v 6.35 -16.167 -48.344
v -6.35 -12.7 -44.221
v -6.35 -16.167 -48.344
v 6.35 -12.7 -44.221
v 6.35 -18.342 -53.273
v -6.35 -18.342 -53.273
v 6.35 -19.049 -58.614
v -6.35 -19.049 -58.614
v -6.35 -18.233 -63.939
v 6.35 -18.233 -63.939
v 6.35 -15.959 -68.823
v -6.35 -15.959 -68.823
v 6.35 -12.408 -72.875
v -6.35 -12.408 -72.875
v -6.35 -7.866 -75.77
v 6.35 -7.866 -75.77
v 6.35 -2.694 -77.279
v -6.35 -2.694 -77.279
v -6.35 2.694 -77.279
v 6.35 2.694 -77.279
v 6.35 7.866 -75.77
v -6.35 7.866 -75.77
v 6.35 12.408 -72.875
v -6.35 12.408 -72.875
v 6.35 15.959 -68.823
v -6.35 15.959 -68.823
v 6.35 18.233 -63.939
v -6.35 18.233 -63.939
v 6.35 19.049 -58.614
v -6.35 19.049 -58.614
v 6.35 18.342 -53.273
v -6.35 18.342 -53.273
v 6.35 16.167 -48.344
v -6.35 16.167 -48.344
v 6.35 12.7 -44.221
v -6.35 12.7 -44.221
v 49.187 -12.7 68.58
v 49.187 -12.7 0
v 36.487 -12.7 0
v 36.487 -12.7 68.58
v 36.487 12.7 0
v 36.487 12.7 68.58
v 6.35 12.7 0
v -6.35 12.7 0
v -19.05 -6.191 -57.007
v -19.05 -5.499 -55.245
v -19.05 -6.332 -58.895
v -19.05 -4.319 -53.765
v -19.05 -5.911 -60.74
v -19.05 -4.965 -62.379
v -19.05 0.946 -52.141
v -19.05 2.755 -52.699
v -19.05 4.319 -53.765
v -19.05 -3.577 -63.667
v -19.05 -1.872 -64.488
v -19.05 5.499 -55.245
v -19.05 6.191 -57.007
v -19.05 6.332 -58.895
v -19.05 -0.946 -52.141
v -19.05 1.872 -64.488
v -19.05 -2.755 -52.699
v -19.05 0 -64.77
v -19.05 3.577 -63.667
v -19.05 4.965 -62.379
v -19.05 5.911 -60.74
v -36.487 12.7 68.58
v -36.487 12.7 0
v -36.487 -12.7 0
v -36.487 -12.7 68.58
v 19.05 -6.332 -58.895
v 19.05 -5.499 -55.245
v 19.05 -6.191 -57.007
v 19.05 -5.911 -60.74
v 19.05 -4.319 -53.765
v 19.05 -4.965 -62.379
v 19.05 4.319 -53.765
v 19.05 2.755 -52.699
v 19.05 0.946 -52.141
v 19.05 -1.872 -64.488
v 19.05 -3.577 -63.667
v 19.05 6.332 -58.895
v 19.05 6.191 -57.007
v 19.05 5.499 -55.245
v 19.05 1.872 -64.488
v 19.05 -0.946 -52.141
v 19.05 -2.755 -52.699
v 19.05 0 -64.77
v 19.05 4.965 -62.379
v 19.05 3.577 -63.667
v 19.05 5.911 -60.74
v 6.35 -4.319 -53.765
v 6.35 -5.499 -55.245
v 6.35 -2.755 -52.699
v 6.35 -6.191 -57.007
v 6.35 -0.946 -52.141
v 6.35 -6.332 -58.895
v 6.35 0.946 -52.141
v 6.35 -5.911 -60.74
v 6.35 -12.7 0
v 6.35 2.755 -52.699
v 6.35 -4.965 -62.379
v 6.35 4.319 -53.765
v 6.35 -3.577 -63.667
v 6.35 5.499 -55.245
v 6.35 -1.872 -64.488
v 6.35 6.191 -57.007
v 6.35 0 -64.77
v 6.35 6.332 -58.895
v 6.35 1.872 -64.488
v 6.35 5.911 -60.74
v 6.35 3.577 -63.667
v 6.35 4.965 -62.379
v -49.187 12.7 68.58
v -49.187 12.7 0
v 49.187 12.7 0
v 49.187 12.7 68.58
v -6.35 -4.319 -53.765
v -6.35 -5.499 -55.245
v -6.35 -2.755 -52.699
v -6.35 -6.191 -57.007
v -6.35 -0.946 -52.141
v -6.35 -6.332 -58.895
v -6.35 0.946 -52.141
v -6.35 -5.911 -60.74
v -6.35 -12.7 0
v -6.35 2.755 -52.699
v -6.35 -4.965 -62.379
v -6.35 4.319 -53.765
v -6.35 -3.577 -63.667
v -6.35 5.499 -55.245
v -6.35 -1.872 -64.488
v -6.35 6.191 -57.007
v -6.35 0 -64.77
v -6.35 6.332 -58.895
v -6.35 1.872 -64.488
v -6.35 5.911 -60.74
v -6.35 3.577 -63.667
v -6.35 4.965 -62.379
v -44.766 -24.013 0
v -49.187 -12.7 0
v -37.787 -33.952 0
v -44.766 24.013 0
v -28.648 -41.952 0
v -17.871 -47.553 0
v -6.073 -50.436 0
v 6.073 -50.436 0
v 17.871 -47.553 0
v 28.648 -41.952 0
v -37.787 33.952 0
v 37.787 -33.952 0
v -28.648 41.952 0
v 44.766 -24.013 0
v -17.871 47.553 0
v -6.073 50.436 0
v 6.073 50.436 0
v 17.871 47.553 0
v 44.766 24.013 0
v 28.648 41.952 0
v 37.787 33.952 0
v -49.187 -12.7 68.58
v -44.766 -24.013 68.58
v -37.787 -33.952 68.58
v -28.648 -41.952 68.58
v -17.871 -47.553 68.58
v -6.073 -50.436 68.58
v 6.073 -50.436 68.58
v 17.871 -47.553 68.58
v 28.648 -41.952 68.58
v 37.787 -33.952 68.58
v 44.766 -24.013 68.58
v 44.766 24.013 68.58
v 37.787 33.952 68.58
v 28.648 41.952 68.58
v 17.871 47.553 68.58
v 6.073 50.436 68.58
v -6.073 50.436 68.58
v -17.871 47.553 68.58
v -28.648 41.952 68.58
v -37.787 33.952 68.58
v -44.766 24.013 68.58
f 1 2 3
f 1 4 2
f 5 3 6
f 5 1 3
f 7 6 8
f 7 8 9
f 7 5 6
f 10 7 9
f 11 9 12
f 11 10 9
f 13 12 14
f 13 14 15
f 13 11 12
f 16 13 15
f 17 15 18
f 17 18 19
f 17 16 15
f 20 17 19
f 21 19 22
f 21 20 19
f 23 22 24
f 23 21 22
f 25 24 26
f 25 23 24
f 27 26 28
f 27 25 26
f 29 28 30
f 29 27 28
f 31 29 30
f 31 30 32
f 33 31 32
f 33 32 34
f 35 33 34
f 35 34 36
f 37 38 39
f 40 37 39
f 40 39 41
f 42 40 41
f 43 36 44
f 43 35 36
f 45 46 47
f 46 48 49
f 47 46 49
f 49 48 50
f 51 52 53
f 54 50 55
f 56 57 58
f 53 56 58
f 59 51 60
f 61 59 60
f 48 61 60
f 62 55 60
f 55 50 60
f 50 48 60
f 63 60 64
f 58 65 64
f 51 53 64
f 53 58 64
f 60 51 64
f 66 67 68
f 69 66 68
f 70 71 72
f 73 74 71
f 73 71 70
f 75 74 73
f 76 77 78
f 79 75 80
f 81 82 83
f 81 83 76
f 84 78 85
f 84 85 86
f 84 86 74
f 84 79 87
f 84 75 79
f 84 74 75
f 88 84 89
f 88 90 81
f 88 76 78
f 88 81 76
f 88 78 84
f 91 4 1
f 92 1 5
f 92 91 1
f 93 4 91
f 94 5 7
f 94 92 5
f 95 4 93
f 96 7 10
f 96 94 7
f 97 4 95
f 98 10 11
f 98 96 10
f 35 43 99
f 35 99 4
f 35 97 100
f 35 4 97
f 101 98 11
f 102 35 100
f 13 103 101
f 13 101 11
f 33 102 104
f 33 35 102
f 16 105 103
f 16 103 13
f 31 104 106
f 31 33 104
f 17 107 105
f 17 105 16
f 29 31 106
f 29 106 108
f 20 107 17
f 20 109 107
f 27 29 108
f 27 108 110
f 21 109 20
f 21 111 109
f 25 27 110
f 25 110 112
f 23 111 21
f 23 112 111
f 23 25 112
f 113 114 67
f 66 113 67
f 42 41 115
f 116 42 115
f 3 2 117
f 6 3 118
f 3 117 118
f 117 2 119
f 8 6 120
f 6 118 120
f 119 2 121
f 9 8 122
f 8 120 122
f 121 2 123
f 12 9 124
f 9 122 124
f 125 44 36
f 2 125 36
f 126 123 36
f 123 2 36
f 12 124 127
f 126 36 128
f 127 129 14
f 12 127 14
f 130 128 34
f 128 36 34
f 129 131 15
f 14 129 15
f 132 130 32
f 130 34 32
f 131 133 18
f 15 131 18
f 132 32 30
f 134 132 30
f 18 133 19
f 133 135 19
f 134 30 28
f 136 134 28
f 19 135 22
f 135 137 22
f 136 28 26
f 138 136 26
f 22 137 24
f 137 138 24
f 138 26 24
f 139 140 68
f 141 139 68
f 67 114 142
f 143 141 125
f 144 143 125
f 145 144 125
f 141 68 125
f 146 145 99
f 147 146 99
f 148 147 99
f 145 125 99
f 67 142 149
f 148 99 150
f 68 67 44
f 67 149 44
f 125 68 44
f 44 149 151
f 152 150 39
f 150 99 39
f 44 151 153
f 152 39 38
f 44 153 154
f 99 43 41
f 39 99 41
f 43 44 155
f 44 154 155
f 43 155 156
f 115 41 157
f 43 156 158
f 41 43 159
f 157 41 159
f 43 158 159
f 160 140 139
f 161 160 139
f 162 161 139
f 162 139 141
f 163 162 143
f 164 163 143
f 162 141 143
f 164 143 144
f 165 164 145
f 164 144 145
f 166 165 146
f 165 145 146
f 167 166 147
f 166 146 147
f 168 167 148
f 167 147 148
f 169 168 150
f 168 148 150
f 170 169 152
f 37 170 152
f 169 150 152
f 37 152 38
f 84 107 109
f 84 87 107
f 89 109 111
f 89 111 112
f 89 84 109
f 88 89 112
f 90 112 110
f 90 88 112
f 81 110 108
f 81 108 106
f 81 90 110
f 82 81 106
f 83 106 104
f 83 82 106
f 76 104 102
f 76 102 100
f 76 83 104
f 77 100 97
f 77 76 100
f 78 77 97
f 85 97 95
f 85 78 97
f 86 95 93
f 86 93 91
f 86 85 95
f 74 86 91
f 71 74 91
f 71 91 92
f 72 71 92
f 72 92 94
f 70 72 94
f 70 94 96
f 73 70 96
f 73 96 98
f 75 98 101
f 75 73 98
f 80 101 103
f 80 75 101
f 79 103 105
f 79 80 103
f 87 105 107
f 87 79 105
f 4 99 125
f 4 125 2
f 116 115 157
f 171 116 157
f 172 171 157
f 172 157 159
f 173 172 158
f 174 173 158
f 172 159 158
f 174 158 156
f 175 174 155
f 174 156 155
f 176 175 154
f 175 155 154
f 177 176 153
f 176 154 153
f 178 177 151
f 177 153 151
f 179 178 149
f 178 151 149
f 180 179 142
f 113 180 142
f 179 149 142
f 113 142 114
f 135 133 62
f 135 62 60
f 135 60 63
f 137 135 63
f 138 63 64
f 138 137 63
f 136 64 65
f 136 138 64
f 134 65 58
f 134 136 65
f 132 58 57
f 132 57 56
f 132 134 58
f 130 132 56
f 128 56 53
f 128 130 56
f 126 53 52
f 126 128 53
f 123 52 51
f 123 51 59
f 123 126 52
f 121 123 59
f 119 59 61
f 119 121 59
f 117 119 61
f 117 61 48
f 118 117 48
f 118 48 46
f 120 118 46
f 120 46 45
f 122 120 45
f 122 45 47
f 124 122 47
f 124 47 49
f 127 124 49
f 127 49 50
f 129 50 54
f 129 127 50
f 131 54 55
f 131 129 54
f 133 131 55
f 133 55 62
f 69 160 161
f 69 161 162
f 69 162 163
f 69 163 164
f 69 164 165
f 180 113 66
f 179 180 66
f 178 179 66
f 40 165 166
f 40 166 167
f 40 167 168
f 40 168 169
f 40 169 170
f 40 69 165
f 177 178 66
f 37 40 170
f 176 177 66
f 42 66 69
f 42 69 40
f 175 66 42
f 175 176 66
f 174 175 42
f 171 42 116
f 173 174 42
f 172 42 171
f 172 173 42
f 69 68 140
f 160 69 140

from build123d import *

# Parameters (mm, degrees)
BOSS_EXTRUDE1_DEPTH = 68.58
SKETCH3_R           = 6.35
BOSS_EXTRUDE2_DEPTH = 6.35
SKETCH3_3_R         = 6.35
BOSS_EXTRUDE3_DEPTH = 19.05


with BuildPart() as part:
    # Sketch1 → Boss-Extrude1 (new body)
    with BuildSketch(Plane.XY):
        with BuildLine():
            Line((-49.186888497, 12.7), (-36.486888497, 12.7))
            Line((-36.486888497, 12.7), (-36.486888497, -12.7))
            Line((-36.486888497, -12.7), (-49.186888497, -12.7))
            ThreePointArc((-49.186888497, -12.7), (0, -50.8), (49.186888497, -12.7))
            Line((49.186888497, -12.7), (36.486888497, -12.7))
            Line((36.486888497, -12.7), (36.486888497, 12.7))
            Line((36.486888497, 12.7), (49.186888497, 12.7))
            ThreePointArc((49.186888497, 12.7), (0, 50.8), (-49.186888497, 12.7))
        make_face()
    extrude(amount=BOSS_EXTRUDE1_DEPTH)

    # Sketch3 → Boss-Extrude2 (add, symmetric)
    with BuildSketch(Plane(origin=(0, 0, 0), x_dir=(0, 0, -1), z_dir=(1, 0, 0))):
        with BuildLine():
            Line((44.220968343, 12.7), (0, 12.7))
            Line((0, 12.7), (0, -12.7))
            Line((0, -12.7), (44.220968343, -12.7))
            ThreePointArc((44.220968343, -12.7), (77.47, 0), (44.220968343, 12.7))
        make_face()
        with Locations((58.42, 0)):
            Circle(SKETCH3_R, mode=Mode.SUBTRACT)
    extrude(amount=BOSS_EXTRUDE2_DEPTH, both=True)

    # Sketch3<3> → Boss-Extrude3 (add, symmetric)
    with BuildSketch(Plane(origin=(0, 0, 0), x_dir=(0, 0, -1), z_dir=(1, 0, 0))):
        with Locations((58.42, 0)):
            Circle(SKETCH3_3_R)
    extrude(amount=BOSS_EXTRUDE3_DEPTH, both=True)


solid = part.part
